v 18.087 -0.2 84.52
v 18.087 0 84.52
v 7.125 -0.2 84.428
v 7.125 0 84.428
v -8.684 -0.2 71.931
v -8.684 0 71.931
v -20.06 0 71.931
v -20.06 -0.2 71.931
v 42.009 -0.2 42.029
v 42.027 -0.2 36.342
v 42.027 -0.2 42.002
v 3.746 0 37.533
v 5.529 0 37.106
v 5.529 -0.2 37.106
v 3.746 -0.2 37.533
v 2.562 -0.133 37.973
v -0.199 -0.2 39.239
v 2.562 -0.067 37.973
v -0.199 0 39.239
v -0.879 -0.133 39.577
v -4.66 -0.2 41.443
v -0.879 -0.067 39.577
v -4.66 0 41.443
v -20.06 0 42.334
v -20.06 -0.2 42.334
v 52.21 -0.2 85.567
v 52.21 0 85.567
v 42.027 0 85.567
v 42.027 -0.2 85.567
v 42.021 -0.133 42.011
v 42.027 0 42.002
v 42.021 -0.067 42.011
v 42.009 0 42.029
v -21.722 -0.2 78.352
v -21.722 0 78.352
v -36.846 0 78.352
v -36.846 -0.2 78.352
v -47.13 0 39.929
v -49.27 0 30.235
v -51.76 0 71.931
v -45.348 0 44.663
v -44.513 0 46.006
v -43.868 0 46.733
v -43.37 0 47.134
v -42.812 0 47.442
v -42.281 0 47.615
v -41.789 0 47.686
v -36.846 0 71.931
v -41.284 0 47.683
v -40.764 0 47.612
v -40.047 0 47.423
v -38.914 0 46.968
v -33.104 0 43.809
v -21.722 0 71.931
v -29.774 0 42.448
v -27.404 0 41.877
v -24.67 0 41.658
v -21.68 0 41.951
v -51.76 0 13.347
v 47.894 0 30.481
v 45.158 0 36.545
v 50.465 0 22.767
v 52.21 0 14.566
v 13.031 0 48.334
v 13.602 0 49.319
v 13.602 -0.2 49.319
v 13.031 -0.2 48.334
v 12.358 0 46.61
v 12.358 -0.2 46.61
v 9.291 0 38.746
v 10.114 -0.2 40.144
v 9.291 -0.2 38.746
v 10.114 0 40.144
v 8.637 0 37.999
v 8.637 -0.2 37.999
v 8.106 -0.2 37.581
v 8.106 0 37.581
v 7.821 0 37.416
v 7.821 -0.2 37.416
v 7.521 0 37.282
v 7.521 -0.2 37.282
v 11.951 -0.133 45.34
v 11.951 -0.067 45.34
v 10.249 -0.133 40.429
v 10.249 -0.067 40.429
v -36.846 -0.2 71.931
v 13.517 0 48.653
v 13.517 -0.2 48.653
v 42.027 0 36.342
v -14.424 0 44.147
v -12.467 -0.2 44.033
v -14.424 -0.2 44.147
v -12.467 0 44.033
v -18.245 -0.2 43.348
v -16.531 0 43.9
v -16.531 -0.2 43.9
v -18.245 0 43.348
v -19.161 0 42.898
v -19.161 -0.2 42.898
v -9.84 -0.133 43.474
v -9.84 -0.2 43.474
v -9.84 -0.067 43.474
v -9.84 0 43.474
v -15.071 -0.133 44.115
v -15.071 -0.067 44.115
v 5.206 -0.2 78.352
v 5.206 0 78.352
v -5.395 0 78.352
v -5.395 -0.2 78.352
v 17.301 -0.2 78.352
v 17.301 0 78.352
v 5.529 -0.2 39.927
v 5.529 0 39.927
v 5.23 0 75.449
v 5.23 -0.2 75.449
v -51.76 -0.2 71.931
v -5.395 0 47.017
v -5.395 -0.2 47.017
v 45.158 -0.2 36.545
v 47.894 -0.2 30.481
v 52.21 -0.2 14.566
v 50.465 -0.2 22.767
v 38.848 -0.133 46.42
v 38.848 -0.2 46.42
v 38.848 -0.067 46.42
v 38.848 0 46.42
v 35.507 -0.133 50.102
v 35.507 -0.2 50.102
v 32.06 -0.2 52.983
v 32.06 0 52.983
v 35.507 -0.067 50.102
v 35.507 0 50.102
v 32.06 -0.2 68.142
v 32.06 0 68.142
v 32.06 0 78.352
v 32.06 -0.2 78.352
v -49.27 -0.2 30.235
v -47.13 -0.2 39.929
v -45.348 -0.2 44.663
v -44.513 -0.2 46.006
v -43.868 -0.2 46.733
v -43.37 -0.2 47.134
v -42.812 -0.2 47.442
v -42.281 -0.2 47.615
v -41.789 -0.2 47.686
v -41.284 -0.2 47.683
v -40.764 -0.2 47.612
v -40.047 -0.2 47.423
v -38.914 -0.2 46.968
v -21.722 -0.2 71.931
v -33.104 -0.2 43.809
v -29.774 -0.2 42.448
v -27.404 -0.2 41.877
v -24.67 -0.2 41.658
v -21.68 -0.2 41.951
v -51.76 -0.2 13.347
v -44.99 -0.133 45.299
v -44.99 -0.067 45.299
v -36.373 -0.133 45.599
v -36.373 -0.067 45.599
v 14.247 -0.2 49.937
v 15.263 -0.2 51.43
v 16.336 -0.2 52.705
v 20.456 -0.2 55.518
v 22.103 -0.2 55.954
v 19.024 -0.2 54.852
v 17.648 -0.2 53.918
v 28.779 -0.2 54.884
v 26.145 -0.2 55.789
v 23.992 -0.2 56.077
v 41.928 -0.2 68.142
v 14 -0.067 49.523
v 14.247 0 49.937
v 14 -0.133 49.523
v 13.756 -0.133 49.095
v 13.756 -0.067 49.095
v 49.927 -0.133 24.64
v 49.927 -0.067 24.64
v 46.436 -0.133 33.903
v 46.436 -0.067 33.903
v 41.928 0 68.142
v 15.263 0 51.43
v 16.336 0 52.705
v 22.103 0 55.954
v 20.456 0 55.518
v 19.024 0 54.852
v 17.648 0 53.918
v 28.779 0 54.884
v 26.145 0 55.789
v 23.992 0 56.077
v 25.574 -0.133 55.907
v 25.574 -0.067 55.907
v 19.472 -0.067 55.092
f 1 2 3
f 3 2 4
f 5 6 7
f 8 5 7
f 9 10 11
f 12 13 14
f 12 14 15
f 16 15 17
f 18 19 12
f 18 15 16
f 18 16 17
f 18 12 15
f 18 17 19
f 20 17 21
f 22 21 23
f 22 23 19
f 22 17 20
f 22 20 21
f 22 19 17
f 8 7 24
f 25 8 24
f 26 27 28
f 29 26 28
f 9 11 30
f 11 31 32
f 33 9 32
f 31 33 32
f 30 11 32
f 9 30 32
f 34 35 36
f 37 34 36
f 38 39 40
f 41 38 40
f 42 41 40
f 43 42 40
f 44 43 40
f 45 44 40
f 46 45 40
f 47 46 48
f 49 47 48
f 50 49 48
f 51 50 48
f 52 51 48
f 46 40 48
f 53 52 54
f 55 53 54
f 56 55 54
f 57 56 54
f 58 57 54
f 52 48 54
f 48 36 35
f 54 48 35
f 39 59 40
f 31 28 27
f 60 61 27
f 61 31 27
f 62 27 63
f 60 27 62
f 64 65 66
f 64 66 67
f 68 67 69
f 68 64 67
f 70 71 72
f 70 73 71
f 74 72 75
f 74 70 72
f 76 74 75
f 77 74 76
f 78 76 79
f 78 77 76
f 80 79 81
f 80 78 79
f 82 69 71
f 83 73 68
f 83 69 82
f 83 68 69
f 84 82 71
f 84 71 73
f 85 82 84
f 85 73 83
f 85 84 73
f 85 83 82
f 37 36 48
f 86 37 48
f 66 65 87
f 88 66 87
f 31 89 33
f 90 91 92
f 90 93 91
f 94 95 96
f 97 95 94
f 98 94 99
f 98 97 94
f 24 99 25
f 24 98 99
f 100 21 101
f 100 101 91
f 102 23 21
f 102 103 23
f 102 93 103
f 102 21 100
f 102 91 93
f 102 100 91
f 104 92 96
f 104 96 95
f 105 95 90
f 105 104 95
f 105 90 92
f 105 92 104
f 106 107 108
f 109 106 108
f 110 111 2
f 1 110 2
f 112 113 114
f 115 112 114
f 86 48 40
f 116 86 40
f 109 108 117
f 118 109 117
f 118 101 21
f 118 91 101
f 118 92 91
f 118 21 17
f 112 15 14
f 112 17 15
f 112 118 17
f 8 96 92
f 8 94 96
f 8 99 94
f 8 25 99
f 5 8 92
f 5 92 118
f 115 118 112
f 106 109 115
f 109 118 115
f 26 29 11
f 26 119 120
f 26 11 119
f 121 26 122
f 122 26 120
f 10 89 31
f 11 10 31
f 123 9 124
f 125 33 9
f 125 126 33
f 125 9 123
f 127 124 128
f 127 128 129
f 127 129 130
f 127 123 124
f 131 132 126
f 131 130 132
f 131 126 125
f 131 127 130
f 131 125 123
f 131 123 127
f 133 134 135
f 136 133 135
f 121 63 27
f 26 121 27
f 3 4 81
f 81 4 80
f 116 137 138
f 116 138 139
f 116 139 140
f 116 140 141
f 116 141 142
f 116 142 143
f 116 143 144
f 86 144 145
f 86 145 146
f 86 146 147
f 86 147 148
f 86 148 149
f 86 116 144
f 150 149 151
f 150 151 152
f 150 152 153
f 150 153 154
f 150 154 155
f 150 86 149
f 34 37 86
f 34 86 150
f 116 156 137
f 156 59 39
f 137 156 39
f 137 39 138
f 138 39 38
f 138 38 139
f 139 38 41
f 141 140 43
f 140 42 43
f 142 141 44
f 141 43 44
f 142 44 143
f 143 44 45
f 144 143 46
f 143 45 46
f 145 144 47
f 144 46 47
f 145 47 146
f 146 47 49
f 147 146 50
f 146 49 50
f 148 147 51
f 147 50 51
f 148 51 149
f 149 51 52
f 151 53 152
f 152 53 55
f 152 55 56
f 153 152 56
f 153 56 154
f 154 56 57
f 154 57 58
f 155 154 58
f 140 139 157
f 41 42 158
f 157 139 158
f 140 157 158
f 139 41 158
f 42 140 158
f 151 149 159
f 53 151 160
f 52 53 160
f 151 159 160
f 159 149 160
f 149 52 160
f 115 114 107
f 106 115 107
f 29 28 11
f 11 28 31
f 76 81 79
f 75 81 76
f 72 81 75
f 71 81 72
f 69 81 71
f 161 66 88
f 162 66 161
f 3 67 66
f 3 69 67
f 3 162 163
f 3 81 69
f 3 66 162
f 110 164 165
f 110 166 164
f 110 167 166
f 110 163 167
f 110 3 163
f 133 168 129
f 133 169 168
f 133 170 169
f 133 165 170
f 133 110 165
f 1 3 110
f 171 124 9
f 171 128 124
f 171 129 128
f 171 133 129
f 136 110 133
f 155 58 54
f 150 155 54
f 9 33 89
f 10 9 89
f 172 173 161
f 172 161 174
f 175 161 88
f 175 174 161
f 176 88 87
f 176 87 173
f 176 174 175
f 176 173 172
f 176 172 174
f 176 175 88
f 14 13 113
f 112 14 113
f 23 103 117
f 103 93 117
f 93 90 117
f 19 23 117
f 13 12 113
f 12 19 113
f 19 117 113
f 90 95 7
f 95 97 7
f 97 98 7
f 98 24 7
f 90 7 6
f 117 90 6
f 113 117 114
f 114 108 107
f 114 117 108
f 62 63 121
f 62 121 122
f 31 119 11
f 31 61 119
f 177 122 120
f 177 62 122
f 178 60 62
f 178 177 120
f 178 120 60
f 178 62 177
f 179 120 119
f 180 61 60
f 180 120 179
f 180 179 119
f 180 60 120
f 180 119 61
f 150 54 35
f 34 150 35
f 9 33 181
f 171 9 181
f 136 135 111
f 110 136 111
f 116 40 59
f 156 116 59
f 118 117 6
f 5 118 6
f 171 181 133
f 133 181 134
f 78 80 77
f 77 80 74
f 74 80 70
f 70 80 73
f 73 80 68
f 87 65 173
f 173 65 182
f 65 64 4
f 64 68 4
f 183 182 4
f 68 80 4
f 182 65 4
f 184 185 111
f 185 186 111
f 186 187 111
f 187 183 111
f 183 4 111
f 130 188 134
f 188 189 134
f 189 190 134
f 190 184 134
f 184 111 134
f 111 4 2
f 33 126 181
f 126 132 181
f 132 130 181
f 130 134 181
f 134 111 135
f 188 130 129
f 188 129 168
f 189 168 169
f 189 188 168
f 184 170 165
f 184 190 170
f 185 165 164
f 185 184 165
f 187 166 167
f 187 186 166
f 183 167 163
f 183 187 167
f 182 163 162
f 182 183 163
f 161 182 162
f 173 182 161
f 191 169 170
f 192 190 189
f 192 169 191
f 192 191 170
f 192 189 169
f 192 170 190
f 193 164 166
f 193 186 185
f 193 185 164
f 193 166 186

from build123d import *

# Parameters (mm, degrees)
F1_DEPTH = 0.2


with BuildPart() as f1:
    # F0 (on Front) → F1 (new body)
    with BuildSketch(Plane.XZ):
        with BuildLine():
            Line((42.0265160501, 85.5667889118), (42.0265160501, 42.0017038809))
            add(Edge.make_bspline(
                [(52.2103376721, 14.5659443964), (50.6263214067, 24.9277971004), (46.798726715, 34.6027262747), (42.0265160501, 42.0017038809)],
                knots=[0, 0, 0, 0, 17.7886226412, 17.7886226412, 17.7886226412, 17.7886226412], degree=3))
            Line((52.2103376721, 14.5659443964), (52.2103376721, 85.5667889118))
            Line((52.2103376721, 85.5667889118), (42.0265160501, 85.5667889118))
        make_face()
    extrude(amount=F1_DEPTH)


with BuildPart() as f1b:
    # F0 (on Front) → F1, piece 2 (new body)
    with BuildSketch(Plane.XZ):
        with BuildLine():
            add(Edge.make_bspline(
                [(42.0265160501, 42.0017038809), (42.0206728018, 42.0107634271), (42.0148281373, 42.0198195612), (42.008982059, 42.0288722802)],
                knots=[17.7886226412, 17.7886226412, 17.7886226412, 17.7886226412, 17.8104036031, 17.8104036031, 17.8104036031, 17.8104036031], degree=3))
            Line((42.008982059, 42.0288722802), (42.0265160501, 36.3416671753))
            Line((42.0265160501, 36.3416671753), (42.0265160501, 42.0017038809))
        make_face()
    extrude(amount=F1_DEPTH)


with BuildPart() as f1c:
    # F0 (on Front) → F1, piece 3 (new body)
    with BuildSketch(Plane.XZ):
        with BuildLine():
            Line((7.1252807975, 84.4279751182), (7.5213783231, 37.2819311913))
            add(Edge.make_bspline(
                [(13.6021144987, 49.3188639125), (11.6515076083, 46.7039014043), (11.0857627782, 38.6496951546), (7.5213783231, 37.2819311913)],
                knots=[0.0386072225, 0.0386072225, 0.0386072225, 0.0386072225, 0.4168758283, 0.4168758283, 0.4168758283, 0.4168758283], degree=3))
            Line((13.6021144987, 49.3188639125), (17.3013494809, 78.3522799611))
            Line((17.3013494809, 78.3522799611), (18.0872064084, 84.5200717449))
            Line((18.0872064084, 84.5200717449), (7.1252807975, 84.4279751182))
        make_face()
        with BuildLine():
            add(Edge.make_bspline(
                [(14.2473069167, 49.9366654104), (14.0147099203, 49.7959858627), (13.8011992575, 49.5857547877), (13.6021144987, 49.3188639125)],
                knots=[0, 0, 0, 0, 0.0386072225, 0.0386072225, 0.0386072225, 0.0386072225], degree=3))
            Line((13.6021144987, 49.3188639125), (13.5172428563, 48.6527495086))
            add(Edge.make_bspline(
                [(14.2473069167, 49.9366654104), (13.9978515882, 49.5304360784), (13.7543806693, 49.1026062986), (13.5172428563, 48.6527495086)],
                knots=[50.4186135761, 50.4186135761, 50.4186135761, 50.4186135761, 51.5661310279, 51.5661310279, 51.5661310279, 51.5661310279], degree=3))
        make_face()
        with BuildLine():
            Line((17.3013494809, 78.3522799611), (13.6021144987, 49.3188639125))
            add(Edge.make_bspline(
                [(14.2473069167, 49.9366654104), (14.0147099203, 49.7959858627), (13.8011992575, 49.5857547877), (13.6021144987, 49.3188639125)],
                knots=[0, 0, 0, 0, 0.0386072225, 0.0386072225, 0.0386072225, 0.0386072225], degree=3))
            add(Edge.make_bspline(
                [(32.059583813, 52.9832693138), (25.5463812852, 57.5747660918), (18.8695229693, 57.4637835977), (14.2473069167, 49.9366654104)],
                knots=[29.1559946555, 29.1559946555, 29.1559946555, 29.1559946555, 50.4186135761, 50.4186135761, 50.4186135761, 50.4186135761], degree=3))
            Line((32.059583813, 52.9832693138), (32.059583813, 68.1419596076))
            Line((32.059583813, 68.1419596076), (32.059583813, 78.3522799611))
            Line((32.059583813, 78.3522799611), (17.3013494809, 78.3522799611))
        make_face()
        with BuildLine():
            Line((32.059583813, 68.1419596076), (32.059583813, 52.9832693138))
            add(Edge.make_bspline(
                [(42.008982059, 42.0288722802), (38.9637899353, 46.7443870322), (35.5349850604, 50.5332773841), (32.059583813, 52.9832693138)],
                knots=[17.8104036031, 17.8104036031, 17.8104036031, 17.8104036031, 29.1559946555, 29.1559946555, 29.1559946555, 29.1559946555], degree=3))
            Line((42.008982059, 42.0288722802), (41.92847386, 68.1419596076))
            Line((41.92847386, 68.1419596076), (32.059583813, 68.1419596076))
        make_face()
    extrude(amount=F1_DEPTH)


with BuildPart() as f1d:
    # F0 (on Front) → F1, piece 4 (new body)
    with BuildSketch(Plane.XZ):
        with BuildLine():
            Line((-20.0604088604, 71.9313248997), (-20.0604088604, 42.3340015113))
            add(Edge.make_bspline(
                [(-4.6595064663, 41.4433681081), (-9.7169673407, 43.8251994711), (-15.2893241305, 45.6708528822), (-20.0604088604, 42.3340015113)],
                knots=[0.7061028455, 0.7061028455, 0.7061028455, 0.7061028455, 1, 1, 1, 1], degree=3))
            Line((-4.6595064663, 41.4433681081), (-5.3951371364, 47.0165840466))
            Line((-5.3951371364, 47.0165840466), (-8.6837316773, 71.9313248997))
            Line((-8.6837316773, 71.9313248997), (-20.0604088604, 71.9313248997))
        make_face()
        with BuildLine():
            Line((5.5288702365, 37.1059729166), (-4.6595064663, 41.4433681081))
            add(Edge.make_bspline(
                [(5.5288702365, 37.1059729166), (2.8436608893, 37.4454765517), (-0.7544317275, 39.6042575903), (-4.6595064663, 41.4433681081)],
                knots=[0.4791726958, 0.4791726958, 0.4791726958, 0.4791726958, 0.7061028455, 0.7061028455, 0.7061028455, 0.7061028455], degree=3))
        make_face()
        Polygon((-5.3951371364, 47.0165840466), (-4.6595064663, 41.4433681081), (5.5288702365, 37.1059729166), (5.5288702365, 39.9273749396), (5.2304350846, 75.449022689), (5.2060433663, 78.3522799611), (-5.3951371364, 78.3522799611), (-5.3951371364, 71.9313248992), align=None)
    extrude(amount=F1_DEPTH)


with BuildPart() as f1e:
    # F0 (on Front) → F1, piece 5 (new body)
    with BuildSketch(Plane.XZ):
        with BuildLine():
            Line((-51.7602663786, 71.9313248992), (-51.7602663786, 13.3466769951))
            add(Edge.make_bspline(
                [(-51.7602663786, 13.3466769951), (-44.50341147, 70.3589431095), (-40.8203894278, 38.3379522292), (-21.6797601847, 41.9511213831)],
                knots=[0, 0, 0, 0, 41.8022676431, 41.8022676431, 41.8022676431, 41.8022676431], degree=3))
            Line((-21.6797601847, 41.9511213831), (-21.7223176733, 47.0165840466))
            Line((-21.7223176733, 47.0165840466), (-21.7223176733, 71.9313248992))
            Line((-21.7223176733, 71.9313248992), (-21.7223176733, 78.3522799611))
            Line((-21.7223176733, 78.3522799611), (-36.8462726475, 78.3522799611))
            Line((-36.8462726475, 78.3522799611), (-36.8462726475, 71.9313248992))
            Line((-36.8462726475, 71.9313248992), (-51.7602663786, 71.9313248992))
        make_face()
        Polygon((-21.7223176733, 47.0165840466), (-21.6797601847, 41.9511213831), (-21.7223176733, 71.9313248992), align=None)
    extrude(amount=F1_DEPTH)


solid = Compound([f1.part, f1b.part, f1c.part, f1d.part, f1e.part])
